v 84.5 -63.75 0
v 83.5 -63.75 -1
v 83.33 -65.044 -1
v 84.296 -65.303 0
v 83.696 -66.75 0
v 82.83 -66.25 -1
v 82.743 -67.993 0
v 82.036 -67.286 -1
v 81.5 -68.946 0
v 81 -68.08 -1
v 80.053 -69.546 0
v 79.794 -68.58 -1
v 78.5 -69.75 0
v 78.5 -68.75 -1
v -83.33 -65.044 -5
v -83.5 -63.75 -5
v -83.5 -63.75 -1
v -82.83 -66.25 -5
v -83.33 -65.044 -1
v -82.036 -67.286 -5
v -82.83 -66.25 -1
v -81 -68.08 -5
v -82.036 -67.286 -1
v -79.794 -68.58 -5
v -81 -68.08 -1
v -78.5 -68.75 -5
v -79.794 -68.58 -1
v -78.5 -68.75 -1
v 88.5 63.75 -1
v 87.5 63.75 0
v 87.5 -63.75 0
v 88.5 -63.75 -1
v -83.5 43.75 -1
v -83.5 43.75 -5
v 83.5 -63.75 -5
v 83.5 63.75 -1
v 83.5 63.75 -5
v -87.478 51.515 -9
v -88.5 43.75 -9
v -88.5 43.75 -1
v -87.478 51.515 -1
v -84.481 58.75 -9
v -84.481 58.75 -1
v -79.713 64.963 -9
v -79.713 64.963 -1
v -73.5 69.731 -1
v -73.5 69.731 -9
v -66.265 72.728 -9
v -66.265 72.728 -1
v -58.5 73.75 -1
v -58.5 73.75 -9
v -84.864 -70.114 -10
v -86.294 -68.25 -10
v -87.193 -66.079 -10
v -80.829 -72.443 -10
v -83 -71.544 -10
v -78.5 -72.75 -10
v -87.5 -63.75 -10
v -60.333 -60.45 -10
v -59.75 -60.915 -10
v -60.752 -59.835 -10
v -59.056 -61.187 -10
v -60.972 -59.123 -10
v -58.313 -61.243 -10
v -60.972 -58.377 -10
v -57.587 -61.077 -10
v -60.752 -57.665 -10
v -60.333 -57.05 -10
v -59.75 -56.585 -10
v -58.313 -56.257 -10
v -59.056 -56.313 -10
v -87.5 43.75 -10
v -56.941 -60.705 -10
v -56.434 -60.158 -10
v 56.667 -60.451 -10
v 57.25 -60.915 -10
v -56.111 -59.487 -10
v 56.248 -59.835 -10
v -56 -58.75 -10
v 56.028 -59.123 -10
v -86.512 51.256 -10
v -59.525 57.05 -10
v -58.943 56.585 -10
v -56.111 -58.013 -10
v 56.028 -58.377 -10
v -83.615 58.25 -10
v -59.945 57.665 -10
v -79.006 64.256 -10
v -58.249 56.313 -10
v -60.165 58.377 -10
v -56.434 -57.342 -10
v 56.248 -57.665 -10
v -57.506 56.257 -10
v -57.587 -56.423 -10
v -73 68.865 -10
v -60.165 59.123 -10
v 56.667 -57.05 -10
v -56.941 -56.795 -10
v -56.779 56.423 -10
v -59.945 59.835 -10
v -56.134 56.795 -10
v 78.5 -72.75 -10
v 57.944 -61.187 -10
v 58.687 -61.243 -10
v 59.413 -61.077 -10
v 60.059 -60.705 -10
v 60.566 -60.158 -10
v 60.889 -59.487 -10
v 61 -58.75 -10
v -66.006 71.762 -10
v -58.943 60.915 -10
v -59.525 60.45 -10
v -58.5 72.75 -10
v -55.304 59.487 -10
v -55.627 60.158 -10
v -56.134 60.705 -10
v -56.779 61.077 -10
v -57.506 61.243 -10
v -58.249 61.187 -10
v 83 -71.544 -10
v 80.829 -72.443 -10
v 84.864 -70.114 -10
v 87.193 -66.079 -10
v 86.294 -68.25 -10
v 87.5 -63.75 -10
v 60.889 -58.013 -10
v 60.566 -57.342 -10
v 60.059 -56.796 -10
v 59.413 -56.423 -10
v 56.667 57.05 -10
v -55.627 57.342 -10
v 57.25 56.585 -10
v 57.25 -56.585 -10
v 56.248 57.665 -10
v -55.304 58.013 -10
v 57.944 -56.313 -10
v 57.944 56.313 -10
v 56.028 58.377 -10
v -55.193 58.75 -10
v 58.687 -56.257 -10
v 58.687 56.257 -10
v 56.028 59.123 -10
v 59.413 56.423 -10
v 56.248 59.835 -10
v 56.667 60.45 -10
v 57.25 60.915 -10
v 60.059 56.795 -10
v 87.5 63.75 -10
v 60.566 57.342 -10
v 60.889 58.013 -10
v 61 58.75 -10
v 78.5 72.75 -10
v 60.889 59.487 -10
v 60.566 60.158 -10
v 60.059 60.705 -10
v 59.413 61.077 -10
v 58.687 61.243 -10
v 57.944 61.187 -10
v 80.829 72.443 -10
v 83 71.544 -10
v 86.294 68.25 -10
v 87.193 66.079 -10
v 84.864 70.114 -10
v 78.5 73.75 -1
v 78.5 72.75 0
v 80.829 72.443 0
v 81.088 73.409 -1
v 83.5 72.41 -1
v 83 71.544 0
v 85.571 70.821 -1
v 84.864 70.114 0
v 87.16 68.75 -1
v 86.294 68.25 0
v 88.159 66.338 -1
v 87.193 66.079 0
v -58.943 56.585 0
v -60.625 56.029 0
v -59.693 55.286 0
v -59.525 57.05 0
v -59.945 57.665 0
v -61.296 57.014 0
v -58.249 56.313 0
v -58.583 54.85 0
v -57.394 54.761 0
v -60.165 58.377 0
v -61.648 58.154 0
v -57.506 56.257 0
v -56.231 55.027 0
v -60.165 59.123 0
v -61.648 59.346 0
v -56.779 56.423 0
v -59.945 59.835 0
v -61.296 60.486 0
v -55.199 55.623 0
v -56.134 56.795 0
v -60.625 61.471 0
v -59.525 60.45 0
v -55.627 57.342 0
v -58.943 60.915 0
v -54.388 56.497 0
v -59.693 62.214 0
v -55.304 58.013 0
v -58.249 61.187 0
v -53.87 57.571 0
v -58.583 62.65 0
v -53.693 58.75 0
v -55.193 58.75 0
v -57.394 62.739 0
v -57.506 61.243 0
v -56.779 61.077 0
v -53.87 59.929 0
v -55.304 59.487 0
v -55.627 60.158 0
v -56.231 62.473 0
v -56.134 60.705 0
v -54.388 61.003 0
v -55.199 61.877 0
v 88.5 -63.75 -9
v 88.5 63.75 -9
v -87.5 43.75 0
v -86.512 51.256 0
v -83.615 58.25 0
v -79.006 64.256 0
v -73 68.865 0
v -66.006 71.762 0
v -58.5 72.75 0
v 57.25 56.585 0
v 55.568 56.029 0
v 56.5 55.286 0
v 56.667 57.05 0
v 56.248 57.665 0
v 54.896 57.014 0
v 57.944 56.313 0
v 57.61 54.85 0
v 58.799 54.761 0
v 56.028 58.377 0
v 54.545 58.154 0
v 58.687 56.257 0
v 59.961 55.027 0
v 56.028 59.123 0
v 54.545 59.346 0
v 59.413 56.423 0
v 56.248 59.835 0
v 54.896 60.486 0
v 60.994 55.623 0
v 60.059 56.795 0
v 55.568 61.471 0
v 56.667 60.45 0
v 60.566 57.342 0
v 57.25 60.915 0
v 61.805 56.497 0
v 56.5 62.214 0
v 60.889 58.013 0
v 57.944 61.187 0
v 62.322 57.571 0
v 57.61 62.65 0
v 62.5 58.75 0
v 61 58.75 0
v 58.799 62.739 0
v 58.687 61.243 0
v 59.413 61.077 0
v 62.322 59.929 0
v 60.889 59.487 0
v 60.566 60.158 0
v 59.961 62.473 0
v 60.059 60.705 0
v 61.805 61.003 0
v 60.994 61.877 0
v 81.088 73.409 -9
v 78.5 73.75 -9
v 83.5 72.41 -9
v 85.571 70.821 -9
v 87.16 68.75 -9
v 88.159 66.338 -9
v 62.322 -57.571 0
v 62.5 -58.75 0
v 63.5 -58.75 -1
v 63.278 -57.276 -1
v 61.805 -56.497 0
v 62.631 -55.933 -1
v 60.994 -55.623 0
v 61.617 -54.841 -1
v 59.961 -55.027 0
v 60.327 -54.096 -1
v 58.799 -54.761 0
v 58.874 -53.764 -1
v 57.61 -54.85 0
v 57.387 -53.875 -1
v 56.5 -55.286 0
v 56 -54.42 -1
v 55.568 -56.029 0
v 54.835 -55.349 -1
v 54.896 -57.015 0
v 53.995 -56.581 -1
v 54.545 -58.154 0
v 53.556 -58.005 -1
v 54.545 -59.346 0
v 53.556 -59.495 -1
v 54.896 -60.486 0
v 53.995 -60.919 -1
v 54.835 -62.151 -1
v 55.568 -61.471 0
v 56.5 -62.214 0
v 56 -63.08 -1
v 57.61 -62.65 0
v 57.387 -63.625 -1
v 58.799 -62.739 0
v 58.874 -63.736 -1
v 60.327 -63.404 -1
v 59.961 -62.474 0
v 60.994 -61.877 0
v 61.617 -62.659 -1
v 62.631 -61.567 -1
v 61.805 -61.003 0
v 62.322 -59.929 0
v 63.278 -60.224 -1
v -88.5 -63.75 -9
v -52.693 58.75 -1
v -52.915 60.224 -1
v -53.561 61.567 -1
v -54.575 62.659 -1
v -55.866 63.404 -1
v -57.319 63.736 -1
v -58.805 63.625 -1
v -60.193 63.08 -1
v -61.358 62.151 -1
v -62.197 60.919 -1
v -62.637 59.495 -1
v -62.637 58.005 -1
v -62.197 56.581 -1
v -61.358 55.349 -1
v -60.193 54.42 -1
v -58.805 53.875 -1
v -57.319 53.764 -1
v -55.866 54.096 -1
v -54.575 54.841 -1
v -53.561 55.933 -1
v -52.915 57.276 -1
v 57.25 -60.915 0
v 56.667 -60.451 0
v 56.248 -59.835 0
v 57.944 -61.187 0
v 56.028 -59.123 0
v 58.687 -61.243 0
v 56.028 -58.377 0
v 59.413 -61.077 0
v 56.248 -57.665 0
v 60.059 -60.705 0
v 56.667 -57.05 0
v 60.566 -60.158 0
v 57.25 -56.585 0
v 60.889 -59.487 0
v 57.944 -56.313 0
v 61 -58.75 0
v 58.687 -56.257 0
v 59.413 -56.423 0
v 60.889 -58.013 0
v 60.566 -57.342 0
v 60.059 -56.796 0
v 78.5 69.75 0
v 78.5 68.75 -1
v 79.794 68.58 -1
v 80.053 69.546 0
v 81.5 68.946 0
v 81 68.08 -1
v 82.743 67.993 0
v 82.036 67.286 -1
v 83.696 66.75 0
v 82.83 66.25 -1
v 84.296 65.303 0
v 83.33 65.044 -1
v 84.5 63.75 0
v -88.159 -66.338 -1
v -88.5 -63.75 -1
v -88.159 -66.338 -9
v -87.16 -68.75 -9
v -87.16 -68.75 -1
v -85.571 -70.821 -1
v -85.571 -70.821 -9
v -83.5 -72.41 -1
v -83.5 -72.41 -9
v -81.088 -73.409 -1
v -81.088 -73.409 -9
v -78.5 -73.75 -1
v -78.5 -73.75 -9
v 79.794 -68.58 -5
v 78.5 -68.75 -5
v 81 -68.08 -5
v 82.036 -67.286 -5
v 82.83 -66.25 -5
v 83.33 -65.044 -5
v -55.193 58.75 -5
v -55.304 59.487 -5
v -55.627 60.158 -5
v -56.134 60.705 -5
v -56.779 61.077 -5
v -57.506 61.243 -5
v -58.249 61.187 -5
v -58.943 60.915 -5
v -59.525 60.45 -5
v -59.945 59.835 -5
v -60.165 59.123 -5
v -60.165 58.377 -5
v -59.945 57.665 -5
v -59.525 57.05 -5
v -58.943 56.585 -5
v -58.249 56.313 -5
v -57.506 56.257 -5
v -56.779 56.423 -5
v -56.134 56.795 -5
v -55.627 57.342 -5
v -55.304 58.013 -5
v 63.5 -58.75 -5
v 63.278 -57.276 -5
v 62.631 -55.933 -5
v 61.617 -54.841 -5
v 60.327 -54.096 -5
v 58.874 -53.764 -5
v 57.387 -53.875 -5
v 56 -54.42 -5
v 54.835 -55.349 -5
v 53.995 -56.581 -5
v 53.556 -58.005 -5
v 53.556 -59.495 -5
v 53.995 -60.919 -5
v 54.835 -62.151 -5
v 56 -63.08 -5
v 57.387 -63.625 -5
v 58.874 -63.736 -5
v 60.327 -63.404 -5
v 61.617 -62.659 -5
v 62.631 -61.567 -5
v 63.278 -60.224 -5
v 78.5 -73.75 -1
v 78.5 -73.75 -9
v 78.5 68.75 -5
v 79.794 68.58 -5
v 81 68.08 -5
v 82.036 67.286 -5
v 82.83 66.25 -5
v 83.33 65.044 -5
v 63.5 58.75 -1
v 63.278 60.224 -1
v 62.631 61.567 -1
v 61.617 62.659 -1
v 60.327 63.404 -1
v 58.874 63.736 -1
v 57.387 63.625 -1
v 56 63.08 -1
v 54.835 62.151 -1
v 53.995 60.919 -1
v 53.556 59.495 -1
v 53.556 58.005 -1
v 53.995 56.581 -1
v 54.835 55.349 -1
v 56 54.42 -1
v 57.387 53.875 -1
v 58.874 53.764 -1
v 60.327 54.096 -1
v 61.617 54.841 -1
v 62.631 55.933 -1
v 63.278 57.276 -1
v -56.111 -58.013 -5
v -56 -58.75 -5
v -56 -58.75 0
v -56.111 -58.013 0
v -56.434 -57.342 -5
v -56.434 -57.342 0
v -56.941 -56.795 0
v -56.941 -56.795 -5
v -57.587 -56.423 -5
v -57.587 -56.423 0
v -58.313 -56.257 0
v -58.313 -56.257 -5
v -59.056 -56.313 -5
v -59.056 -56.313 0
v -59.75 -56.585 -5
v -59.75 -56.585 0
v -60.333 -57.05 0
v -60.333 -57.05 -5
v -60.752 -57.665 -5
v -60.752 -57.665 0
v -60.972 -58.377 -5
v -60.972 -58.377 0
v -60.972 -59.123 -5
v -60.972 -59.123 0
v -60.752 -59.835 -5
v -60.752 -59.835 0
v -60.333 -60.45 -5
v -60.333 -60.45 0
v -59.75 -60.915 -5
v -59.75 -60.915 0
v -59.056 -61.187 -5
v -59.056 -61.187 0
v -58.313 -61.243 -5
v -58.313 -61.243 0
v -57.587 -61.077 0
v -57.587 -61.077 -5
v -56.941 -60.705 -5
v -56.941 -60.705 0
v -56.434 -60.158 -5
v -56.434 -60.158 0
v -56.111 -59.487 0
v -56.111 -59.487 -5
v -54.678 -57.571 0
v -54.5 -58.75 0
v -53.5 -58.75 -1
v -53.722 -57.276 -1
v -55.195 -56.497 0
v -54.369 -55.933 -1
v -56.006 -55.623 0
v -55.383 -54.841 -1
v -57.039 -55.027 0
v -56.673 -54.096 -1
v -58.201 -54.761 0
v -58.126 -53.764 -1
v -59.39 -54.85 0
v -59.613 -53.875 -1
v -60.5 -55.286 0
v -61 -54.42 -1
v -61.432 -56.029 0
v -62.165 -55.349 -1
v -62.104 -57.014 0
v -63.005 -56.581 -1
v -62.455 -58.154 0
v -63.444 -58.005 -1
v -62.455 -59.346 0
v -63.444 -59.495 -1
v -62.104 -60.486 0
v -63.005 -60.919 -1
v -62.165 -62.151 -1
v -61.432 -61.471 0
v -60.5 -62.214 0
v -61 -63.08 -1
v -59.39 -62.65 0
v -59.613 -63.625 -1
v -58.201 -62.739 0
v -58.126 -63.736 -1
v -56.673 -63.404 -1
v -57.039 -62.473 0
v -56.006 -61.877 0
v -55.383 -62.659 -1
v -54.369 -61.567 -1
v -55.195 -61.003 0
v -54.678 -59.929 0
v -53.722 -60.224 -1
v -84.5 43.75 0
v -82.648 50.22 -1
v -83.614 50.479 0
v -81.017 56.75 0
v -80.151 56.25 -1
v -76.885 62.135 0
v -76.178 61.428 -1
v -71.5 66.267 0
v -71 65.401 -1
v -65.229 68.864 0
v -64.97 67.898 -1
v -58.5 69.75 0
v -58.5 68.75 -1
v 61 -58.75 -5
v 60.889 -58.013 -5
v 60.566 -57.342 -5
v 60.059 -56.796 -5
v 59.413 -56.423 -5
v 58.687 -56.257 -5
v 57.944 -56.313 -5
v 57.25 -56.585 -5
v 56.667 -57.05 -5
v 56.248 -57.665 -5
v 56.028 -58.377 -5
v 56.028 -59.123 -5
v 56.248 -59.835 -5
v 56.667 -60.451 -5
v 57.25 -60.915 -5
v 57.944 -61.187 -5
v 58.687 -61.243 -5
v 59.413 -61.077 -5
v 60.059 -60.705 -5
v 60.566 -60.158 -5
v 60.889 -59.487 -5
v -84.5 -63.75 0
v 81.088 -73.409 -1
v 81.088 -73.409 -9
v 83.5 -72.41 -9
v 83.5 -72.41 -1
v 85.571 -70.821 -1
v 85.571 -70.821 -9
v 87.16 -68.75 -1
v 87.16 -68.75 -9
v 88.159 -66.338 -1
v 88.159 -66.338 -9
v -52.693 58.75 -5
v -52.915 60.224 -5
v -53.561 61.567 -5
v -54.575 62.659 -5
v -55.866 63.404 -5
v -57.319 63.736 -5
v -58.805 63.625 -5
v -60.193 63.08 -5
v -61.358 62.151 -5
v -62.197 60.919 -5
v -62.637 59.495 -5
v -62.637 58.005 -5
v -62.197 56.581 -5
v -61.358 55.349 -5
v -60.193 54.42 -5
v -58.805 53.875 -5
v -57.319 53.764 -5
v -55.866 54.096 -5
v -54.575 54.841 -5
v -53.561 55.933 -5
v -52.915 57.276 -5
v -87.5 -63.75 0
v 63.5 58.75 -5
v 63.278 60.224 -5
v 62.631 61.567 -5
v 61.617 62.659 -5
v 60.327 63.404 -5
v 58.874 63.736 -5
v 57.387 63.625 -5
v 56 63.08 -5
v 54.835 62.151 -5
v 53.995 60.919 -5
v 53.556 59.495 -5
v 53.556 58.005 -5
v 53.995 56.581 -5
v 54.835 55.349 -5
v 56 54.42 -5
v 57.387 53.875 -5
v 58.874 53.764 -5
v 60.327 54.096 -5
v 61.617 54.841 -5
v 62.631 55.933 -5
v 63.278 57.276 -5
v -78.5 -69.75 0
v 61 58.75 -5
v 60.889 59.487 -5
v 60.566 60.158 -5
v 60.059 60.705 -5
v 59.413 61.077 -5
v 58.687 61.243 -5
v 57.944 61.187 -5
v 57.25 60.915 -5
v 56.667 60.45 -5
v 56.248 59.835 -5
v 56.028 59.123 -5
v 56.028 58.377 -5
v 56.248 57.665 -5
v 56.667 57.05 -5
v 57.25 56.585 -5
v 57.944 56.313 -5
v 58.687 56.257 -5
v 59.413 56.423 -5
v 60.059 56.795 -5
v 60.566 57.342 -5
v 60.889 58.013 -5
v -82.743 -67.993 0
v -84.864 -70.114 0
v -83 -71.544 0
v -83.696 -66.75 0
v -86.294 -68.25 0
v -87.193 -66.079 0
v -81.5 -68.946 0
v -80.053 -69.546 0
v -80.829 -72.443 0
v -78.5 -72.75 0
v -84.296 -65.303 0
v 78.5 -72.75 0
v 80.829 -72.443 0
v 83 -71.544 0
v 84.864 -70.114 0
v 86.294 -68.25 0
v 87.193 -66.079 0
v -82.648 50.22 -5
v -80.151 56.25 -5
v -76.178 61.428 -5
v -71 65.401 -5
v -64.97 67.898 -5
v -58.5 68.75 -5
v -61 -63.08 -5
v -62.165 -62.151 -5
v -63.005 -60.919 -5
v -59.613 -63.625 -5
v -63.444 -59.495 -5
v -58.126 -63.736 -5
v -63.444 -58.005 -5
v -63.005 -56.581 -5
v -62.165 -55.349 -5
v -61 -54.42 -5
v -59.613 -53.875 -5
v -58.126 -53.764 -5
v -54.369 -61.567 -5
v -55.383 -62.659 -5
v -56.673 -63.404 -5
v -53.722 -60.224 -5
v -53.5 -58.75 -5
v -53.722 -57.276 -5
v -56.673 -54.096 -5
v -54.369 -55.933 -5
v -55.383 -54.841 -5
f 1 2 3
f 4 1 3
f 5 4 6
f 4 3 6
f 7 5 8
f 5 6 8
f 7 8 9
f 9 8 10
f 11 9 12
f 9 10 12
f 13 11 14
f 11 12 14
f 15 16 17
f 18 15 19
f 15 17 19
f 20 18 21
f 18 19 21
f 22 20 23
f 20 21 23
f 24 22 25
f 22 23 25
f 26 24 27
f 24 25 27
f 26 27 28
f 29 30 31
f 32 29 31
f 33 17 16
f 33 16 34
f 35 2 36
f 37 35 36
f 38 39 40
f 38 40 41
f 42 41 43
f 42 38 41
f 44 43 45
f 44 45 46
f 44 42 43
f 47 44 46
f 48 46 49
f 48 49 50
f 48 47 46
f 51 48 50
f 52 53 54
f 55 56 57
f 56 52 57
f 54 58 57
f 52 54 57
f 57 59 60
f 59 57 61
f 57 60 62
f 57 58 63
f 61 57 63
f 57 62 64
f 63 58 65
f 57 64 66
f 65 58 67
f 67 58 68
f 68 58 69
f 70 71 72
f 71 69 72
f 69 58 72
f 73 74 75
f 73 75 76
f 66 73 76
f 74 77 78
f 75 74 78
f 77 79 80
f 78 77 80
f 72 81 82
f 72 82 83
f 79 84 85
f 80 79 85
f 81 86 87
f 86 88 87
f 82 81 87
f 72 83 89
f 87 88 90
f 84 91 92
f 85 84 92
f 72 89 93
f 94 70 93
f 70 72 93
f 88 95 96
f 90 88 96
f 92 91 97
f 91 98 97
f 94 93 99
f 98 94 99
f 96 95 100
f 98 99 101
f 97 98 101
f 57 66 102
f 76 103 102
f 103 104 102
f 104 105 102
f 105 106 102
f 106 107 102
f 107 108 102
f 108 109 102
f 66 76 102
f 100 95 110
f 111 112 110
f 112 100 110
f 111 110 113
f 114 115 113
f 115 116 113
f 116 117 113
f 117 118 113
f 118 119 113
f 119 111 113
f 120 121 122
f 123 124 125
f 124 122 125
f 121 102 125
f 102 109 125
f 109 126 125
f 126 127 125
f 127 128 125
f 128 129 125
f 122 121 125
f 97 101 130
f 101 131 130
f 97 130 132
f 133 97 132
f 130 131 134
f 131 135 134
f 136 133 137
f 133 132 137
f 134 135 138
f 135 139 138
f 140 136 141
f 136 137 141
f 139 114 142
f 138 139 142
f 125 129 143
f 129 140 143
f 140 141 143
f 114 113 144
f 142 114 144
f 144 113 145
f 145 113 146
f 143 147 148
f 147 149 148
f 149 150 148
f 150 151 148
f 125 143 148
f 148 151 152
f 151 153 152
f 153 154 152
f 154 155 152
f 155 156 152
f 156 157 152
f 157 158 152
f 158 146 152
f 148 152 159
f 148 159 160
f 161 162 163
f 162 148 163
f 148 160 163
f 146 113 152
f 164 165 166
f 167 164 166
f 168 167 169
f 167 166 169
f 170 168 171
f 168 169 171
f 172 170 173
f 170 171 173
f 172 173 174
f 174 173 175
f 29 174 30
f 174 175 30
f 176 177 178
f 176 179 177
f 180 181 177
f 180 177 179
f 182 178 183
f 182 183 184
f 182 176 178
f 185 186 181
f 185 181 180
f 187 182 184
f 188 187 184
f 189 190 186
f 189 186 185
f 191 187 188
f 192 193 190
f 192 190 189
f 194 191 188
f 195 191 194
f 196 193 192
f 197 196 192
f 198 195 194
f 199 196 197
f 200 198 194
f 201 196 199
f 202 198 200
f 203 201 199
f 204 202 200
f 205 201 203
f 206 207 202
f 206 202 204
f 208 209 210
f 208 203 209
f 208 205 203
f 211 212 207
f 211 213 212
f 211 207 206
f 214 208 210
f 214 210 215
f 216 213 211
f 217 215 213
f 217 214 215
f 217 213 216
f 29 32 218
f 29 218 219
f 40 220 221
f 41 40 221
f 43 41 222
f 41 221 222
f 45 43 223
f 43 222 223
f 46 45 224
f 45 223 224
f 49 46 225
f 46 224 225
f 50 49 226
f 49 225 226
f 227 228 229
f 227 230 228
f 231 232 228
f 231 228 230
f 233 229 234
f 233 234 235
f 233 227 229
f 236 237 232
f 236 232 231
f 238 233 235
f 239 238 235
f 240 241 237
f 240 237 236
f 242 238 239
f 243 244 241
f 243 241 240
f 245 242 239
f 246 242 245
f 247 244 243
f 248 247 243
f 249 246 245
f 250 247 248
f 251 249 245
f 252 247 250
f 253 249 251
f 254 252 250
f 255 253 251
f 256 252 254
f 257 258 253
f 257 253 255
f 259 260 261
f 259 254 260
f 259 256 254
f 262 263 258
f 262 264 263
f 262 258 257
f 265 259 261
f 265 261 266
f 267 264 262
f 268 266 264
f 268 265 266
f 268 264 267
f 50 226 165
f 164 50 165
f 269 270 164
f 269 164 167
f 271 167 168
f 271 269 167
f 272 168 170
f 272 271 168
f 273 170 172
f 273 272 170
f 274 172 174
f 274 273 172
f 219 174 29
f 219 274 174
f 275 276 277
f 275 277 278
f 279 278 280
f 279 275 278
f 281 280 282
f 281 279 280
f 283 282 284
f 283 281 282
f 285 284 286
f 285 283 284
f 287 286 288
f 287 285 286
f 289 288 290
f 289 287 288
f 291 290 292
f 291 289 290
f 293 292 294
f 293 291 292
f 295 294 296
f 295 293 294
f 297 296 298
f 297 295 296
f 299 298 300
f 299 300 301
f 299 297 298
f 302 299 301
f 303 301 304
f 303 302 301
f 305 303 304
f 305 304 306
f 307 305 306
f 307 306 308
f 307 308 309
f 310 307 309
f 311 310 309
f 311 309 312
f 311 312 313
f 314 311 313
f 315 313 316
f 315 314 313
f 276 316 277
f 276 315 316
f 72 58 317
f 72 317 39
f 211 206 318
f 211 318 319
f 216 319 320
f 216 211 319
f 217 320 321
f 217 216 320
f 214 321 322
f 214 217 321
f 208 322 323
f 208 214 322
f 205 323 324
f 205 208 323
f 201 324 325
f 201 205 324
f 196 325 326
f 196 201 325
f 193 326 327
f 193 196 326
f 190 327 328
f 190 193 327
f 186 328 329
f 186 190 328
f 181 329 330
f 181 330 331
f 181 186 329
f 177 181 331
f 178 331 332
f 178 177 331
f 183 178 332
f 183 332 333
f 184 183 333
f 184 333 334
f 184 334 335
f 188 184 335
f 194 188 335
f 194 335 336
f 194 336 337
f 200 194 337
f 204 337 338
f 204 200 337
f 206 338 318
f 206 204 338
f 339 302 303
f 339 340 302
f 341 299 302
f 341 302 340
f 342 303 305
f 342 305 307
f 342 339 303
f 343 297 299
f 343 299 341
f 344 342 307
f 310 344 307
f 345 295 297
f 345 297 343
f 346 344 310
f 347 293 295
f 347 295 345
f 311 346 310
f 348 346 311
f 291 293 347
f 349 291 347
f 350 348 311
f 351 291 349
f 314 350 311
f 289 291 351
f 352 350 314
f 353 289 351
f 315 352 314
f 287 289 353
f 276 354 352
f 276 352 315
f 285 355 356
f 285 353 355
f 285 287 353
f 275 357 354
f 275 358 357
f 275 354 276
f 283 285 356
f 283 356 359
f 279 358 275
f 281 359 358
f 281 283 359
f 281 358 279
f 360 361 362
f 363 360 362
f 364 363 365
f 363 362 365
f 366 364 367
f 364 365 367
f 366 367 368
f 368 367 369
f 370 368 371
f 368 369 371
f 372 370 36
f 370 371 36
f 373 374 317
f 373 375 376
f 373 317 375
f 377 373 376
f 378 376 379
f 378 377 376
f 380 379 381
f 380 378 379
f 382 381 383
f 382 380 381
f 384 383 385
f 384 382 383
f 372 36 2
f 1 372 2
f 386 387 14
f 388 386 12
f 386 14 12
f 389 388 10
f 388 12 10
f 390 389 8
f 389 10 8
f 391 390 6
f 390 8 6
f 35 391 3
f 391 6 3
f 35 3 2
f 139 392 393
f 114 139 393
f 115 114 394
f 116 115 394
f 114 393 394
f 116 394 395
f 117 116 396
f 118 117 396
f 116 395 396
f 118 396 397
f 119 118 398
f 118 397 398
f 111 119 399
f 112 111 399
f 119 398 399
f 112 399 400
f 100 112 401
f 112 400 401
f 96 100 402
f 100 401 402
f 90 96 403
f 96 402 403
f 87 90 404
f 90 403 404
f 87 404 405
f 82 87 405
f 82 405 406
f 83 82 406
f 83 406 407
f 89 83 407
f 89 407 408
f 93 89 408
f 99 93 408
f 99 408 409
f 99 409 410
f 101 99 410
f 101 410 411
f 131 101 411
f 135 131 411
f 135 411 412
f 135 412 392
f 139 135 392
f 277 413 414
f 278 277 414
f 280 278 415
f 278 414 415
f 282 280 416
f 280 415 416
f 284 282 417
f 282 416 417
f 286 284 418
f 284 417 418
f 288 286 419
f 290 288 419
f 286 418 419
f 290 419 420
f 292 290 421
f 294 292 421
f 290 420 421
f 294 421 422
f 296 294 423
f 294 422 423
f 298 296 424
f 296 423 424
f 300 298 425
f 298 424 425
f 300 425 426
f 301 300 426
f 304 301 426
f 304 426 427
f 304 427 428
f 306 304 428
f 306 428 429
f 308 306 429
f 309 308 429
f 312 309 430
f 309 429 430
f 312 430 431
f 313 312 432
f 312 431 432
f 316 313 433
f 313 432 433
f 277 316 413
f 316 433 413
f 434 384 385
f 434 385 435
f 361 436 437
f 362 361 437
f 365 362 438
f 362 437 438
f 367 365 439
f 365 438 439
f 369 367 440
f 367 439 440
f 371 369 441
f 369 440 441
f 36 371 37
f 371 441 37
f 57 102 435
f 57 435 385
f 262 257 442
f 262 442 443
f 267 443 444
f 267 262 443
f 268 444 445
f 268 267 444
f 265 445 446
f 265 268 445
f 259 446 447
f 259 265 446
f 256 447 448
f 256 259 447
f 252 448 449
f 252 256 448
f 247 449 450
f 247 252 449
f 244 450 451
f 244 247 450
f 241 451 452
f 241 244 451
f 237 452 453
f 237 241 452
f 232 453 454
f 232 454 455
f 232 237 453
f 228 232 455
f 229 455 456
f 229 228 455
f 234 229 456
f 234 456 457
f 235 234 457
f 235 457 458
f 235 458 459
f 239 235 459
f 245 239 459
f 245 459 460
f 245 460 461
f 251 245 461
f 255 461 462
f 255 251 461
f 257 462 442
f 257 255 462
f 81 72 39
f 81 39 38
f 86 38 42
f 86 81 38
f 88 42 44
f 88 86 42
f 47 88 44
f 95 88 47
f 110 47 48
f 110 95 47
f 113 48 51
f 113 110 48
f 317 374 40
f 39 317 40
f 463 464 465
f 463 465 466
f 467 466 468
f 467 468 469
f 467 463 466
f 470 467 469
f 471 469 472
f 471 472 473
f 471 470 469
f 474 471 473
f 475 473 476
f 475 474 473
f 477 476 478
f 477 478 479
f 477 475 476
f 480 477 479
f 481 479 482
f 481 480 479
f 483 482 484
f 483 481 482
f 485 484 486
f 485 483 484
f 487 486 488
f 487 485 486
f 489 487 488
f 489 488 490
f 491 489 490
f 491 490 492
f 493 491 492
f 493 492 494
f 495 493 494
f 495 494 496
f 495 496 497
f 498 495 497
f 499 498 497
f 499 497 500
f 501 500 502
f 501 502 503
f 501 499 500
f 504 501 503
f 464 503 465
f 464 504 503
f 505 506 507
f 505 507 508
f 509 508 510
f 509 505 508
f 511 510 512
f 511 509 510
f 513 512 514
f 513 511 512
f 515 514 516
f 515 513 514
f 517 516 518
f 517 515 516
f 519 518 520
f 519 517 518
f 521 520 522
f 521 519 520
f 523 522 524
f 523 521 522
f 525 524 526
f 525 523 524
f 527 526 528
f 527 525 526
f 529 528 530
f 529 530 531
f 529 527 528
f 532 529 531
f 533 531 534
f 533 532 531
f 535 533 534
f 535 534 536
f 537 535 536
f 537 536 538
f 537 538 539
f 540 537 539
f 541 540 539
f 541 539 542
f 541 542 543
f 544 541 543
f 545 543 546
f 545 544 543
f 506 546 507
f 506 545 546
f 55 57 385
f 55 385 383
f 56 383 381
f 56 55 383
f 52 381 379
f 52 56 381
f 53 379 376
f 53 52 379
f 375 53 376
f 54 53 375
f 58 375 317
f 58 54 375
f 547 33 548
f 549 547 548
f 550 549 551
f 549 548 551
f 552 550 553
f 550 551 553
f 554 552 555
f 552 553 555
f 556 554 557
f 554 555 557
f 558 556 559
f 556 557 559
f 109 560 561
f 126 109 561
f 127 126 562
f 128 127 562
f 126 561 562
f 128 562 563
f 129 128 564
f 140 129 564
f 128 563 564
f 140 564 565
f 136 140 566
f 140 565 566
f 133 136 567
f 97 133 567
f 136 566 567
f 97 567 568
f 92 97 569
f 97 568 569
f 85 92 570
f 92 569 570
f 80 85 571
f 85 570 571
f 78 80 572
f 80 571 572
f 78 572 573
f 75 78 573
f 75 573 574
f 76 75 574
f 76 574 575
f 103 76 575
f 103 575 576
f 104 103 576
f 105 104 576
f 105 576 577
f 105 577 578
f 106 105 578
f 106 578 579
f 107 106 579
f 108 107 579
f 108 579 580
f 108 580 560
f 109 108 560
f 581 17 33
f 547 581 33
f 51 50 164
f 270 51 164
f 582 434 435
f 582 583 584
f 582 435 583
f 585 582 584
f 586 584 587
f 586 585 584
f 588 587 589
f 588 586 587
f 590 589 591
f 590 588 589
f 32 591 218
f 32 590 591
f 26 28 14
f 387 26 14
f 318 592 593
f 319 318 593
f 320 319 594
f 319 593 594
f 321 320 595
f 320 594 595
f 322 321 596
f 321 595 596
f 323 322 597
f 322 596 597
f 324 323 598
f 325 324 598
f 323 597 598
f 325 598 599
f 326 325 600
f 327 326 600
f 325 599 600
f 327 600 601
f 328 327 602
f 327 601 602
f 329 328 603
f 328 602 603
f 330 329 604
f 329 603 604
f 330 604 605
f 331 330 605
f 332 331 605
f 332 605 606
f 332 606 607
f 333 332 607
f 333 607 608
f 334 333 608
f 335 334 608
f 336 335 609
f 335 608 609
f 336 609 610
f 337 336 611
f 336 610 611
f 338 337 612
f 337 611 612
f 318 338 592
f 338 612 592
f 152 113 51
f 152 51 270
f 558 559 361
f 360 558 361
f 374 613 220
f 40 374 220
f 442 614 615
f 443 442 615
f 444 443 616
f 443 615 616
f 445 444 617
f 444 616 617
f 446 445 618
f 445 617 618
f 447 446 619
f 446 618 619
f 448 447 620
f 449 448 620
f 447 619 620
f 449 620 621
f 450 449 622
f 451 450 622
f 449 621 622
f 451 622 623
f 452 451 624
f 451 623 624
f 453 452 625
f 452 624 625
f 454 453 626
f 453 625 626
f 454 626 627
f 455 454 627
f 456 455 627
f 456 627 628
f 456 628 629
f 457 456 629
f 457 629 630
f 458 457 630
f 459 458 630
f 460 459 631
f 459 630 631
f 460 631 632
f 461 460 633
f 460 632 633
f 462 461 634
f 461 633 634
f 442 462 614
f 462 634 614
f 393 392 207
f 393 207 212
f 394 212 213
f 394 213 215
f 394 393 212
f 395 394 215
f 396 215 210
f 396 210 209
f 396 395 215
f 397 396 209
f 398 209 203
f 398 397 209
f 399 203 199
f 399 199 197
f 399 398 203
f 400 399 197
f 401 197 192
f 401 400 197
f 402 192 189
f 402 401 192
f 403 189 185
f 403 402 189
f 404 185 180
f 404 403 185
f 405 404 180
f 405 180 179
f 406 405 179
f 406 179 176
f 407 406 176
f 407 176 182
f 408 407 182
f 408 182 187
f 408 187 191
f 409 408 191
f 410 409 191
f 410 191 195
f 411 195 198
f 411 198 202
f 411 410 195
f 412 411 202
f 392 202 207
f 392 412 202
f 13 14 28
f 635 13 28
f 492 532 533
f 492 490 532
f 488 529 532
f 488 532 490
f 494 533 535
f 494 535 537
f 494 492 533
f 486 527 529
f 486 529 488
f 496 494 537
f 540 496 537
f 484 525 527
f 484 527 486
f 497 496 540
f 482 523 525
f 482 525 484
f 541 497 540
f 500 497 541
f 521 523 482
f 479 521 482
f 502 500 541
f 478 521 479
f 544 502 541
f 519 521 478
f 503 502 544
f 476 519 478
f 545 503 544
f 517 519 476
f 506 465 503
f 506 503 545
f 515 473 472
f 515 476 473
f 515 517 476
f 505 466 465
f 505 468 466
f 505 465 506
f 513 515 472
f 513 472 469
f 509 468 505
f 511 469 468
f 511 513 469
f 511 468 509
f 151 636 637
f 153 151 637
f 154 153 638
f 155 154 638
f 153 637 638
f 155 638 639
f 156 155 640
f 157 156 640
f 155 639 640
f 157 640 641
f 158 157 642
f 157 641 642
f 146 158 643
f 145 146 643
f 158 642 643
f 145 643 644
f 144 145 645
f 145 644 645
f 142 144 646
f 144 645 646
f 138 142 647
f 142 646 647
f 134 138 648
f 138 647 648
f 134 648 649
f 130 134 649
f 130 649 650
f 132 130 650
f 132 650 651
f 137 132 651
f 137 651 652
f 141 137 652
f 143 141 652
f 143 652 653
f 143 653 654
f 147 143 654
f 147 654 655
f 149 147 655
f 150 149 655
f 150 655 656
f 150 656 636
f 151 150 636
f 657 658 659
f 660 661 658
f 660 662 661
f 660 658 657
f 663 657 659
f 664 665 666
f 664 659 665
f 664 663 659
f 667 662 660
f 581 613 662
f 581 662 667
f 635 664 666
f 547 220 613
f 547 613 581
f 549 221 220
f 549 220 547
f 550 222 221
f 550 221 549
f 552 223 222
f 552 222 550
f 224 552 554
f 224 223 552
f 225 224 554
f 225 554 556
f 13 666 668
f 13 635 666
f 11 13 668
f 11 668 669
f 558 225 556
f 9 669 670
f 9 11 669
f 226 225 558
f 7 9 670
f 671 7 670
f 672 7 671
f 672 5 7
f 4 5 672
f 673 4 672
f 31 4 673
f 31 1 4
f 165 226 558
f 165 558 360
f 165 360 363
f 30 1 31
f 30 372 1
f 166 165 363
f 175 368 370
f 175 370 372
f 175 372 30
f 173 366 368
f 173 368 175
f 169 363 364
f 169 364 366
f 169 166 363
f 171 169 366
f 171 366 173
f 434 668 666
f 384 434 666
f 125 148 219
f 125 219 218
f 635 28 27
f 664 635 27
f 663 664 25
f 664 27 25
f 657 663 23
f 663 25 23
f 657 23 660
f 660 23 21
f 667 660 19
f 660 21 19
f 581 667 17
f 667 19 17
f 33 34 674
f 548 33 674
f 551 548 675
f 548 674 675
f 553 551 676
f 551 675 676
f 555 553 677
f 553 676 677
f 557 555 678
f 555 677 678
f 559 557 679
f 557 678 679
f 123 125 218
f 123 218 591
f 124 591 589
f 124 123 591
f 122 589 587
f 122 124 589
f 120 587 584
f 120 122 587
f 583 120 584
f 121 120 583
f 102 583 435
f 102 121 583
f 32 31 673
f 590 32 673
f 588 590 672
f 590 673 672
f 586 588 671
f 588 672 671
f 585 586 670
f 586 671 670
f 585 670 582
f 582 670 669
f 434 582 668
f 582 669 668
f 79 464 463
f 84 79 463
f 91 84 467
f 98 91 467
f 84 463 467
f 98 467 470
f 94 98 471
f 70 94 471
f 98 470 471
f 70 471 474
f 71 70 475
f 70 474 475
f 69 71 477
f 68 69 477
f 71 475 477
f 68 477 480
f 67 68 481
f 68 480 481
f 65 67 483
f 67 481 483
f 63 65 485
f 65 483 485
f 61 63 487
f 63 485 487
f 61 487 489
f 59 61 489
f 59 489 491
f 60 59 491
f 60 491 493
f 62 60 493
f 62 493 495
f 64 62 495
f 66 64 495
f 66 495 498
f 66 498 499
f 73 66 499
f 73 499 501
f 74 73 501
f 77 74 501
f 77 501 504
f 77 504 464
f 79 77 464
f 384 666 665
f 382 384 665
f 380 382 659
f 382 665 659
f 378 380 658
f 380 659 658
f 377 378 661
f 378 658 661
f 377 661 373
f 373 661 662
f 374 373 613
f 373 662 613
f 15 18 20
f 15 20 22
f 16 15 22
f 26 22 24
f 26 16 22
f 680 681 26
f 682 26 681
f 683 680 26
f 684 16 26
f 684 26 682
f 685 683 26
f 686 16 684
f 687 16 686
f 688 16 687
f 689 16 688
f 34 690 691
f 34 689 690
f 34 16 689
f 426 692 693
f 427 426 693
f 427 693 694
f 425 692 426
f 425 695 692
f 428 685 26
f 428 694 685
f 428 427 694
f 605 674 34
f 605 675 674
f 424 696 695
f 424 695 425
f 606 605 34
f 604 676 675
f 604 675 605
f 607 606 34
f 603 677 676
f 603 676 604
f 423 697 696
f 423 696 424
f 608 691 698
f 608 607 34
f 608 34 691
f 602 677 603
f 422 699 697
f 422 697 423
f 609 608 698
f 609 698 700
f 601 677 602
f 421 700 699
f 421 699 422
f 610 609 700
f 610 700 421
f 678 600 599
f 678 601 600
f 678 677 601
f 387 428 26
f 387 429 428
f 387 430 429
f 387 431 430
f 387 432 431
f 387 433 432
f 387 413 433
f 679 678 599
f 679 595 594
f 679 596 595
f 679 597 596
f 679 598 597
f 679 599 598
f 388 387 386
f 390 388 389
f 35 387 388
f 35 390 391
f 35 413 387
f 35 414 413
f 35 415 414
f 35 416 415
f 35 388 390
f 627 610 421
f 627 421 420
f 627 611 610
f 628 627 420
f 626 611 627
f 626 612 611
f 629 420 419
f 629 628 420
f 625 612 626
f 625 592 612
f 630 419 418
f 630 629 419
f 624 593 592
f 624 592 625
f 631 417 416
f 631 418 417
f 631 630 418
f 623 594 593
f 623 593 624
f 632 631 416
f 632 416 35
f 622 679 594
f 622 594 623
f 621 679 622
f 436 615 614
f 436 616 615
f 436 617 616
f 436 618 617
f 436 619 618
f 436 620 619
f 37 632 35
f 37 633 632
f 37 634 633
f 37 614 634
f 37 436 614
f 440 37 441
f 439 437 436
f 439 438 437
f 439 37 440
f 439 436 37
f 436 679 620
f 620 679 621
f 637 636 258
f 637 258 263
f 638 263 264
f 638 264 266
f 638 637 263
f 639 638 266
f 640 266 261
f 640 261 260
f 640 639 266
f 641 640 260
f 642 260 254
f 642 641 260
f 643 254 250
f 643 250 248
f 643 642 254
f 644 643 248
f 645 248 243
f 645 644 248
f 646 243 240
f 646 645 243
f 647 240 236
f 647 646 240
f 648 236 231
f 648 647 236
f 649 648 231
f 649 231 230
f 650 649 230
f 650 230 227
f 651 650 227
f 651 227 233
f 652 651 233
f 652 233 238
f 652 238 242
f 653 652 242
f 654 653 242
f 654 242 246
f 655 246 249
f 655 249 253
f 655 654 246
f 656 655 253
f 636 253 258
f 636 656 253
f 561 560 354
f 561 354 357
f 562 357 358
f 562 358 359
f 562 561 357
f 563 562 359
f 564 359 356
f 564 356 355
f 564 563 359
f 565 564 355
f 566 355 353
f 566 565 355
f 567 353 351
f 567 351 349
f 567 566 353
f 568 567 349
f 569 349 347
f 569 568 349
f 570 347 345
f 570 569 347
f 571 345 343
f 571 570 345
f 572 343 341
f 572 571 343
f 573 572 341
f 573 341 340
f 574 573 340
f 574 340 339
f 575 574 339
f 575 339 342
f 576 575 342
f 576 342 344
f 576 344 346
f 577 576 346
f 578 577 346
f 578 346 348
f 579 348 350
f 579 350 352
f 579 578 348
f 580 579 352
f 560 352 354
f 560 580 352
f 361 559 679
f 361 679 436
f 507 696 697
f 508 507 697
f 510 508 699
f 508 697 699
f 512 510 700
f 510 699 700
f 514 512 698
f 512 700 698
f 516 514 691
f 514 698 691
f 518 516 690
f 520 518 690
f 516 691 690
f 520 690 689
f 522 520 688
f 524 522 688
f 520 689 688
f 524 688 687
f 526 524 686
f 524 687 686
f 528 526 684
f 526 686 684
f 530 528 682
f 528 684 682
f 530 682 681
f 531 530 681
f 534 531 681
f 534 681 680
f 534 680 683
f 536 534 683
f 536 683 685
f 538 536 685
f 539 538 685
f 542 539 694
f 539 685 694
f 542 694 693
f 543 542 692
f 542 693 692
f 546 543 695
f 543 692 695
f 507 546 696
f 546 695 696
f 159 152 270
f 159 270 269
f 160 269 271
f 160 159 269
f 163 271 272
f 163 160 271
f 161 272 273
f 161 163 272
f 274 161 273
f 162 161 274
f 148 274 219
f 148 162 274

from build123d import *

# Parameters (mm, degrees)
SKETCH1_W                       = 177
SKETCH1_H                       = 147.5
BOSS_EXTRUDE1_DEPTH             = 10
FILLET2_R                       = 30
FILLET3_R                       = 10
SKETCH6_W                       = 177
SKETCH6_H                       = 10
CUT_EXTRUDE14_DEPTH             = 74.75
CUT_EXTRUDE14_DEPTH_BACK        = 74.75
SHELL1_T                        = -5
CHAMFER1_SIZE                   = 1
TAP_DRILL_FOR_M6X1_0_TAP1_D     = 5
TAP_DRILL_FOR_M6X1_0_TAP1_DEPTH = 18
TAP_DRILL_FOR_M6X1_0_TAP1_TIP   = 1.502151548
SKETCH9_R                       = 5
SKETCH9_R_2                     = 2.5
BOSS_EXTRUDE2_DEPTH             = 5
CHAMFER2_SIZE                   = 1


with BuildPart() as part:
    # Sketch1 → Boss-Extrude1 (new body, symmetric)
    with BuildSketch(Plane.XY):
        Rectangle(SKETCH1_W, SKETCH1_H)
    extrude(amount=BOSS_EXTRUDE1_DEPTH, both=True)

    # Fillet2
    fillet2_edges = [part.edges().sort_by_distance(p)[0] for p in [
        (-88.5, 73.75, 0),
    ]]
    fillet(fillet2_edges, radius=FILLET2_R)

    # Fillet3
    fillet3_edges = [part.edges().sort_by_distance(p)[0] for p in [
        (88.5, -73.75, 0),
        (-88.5, -73.75, 0),
        (88.5, 73.75, 0),
    ]]
    fillet(fillet3_edges, radius=FILLET3_R)

    # Sketch6 → Cut-Extrude14 (cut, two sides)
    with BuildSketch(Plane(origin=(0, 0, 0), x_dir=(1, 0, 0), z_dir=(0, 1, 0))) as cut_extrude14_sk:
        with Locations((0, -5)):
            Rectangle(SKETCH6_W, SKETCH6_H)
    extrude(amount=CUT_EXTRUDE14_DEPTH, mode=Mode.SUBTRACT)
    extrude(cut_extrude14_sk.sketch, amount=-CUT_EXTRUDE14_DEPTH_BACK, mode=Mode.SUBTRACT)

    # Shell1
    shell1_openings = [part.faces().sort_by_distance(p)[0] for p in [
        (1.982233047, -1.982233047, 0),
    ]]
    offset(amount=SHELL1_T, openings=shell1_openings, kind=Kind.INTERSECTION)

    # Chamfer1
    chamfer1_edges = [part.edges().sort_by_distance(p)[0] for p in [
        (-88.5, -10, -10),
        (-79.713203436, 64.963203436, -10),
        (0, -73.75, -10),
        (10, 73.75, -10),
        (88.5, 0, -10),
        (85.571067812, 70.821067812, -10),
        (85.571067812, -70.821067812, -10),
        (-85.571067812, -70.821067812, -10),
        (85.571067812, 70.821067812, 0),
        (-79.713203436, 64.963203436, 0),
        (-85.571067812, -70.821067812, 0),
        (85.571067812, -70.821067812, 0),
        (88.5, 0, 0),
        (10, 73.75, 0),
        (0, -73.75, 0),
        (-88.5, -10, 0),
        (-83.5, -10, 0),
        (0, -68.75, 0),
        (-76.17766953, 61.42766953, 0),
        (-82.035533906, -67.285533906, 0),
        (82.035533906, -67.285533906, 0),
        (83.5, 0, 0),
        (82.035533906, 67.285533906, 0),
        (10, 68.75, 0),
    ]]
    chamfer(chamfer1_edges, length=CHAMFER1_SIZE)

    # Tap Drill for M6x1.0 Tap1
    with Locations(Plane(origin=(-88.5, -73.75, -10), x_dir=(-1, 0, 0), z_dir=(0, 0, -1))):
        with Locations((-147, 132.5), (-30.807394368, 132.5), (-30, 15), (-147, 14.999919373)):
            Hole(TAP_DRILL_FOR_M6X1_0_TAP1_D / 2, depth=TAP_DRILL_FOR_M6X1_0_TAP1_DEPTH)
            with Locations((0, 0, -(TAP_DRILL_FOR_M6X1_0_TAP1_DEPTH + TAP_DRILL_FOR_M6X1_0_TAP1_TIP / 2))):  # 118° drill point
                Cone(0, TAP_DRILL_FOR_M6X1_0_TAP1_D / 2, TAP_DRILL_FOR_M6X1_0_TAP1_TIP, mode=Mode.SUBTRACT)

    # Sketch9 → Boss-Extrude2 (add)
    with BuildSketch(Plane.XY.offset(-5)):
        with Locations((-57.692605632, 58.75)):
            Circle(SKETCH9_R)
        with Locations((-57.692605632, 58.75)):
            Circle(SKETCH9_R_2, mode=Mode.SUBTRACT)
        with Locations((58.5, 58.75)):
            Circle(SKETCH9_R)
        with Locations((58.5, 58.75)):
            Circle(SKETCH9_R_2, mode=Mode.SUBTRACT)
        with Locations((58.5, -58.750080627)):
            Circle(SKETCH9_R)
        with Locations((58.5, -58.750080627)):
            Circle(SKETCH9_R_2, mode=Mode.SUBTRACT)
        with Locations((-58.5, -58.75)):
            Circle(SKETCH9_R)
        with Locations((-58.5, -58.75)):
            Circle(SKETCH9_R_2, mode=Mode.SUBTRACT)
    extrude(amount=BOSS_EXTRUDE2_DEPTH)

    # Chamfer2
    chamfer2_edges = [part.edges().sort_by_distance(p)[0] for p in [
        (-62.692605632, 58.75, 0),
        (53.5, 58.75, 0),
        (53.5, -58.750080627, 0),
        (-63.5, -58.75, 0),
    ]]
    chamfer(chamfer2_edges, length=CHAMFER2_SIZE)


solid = part.part
